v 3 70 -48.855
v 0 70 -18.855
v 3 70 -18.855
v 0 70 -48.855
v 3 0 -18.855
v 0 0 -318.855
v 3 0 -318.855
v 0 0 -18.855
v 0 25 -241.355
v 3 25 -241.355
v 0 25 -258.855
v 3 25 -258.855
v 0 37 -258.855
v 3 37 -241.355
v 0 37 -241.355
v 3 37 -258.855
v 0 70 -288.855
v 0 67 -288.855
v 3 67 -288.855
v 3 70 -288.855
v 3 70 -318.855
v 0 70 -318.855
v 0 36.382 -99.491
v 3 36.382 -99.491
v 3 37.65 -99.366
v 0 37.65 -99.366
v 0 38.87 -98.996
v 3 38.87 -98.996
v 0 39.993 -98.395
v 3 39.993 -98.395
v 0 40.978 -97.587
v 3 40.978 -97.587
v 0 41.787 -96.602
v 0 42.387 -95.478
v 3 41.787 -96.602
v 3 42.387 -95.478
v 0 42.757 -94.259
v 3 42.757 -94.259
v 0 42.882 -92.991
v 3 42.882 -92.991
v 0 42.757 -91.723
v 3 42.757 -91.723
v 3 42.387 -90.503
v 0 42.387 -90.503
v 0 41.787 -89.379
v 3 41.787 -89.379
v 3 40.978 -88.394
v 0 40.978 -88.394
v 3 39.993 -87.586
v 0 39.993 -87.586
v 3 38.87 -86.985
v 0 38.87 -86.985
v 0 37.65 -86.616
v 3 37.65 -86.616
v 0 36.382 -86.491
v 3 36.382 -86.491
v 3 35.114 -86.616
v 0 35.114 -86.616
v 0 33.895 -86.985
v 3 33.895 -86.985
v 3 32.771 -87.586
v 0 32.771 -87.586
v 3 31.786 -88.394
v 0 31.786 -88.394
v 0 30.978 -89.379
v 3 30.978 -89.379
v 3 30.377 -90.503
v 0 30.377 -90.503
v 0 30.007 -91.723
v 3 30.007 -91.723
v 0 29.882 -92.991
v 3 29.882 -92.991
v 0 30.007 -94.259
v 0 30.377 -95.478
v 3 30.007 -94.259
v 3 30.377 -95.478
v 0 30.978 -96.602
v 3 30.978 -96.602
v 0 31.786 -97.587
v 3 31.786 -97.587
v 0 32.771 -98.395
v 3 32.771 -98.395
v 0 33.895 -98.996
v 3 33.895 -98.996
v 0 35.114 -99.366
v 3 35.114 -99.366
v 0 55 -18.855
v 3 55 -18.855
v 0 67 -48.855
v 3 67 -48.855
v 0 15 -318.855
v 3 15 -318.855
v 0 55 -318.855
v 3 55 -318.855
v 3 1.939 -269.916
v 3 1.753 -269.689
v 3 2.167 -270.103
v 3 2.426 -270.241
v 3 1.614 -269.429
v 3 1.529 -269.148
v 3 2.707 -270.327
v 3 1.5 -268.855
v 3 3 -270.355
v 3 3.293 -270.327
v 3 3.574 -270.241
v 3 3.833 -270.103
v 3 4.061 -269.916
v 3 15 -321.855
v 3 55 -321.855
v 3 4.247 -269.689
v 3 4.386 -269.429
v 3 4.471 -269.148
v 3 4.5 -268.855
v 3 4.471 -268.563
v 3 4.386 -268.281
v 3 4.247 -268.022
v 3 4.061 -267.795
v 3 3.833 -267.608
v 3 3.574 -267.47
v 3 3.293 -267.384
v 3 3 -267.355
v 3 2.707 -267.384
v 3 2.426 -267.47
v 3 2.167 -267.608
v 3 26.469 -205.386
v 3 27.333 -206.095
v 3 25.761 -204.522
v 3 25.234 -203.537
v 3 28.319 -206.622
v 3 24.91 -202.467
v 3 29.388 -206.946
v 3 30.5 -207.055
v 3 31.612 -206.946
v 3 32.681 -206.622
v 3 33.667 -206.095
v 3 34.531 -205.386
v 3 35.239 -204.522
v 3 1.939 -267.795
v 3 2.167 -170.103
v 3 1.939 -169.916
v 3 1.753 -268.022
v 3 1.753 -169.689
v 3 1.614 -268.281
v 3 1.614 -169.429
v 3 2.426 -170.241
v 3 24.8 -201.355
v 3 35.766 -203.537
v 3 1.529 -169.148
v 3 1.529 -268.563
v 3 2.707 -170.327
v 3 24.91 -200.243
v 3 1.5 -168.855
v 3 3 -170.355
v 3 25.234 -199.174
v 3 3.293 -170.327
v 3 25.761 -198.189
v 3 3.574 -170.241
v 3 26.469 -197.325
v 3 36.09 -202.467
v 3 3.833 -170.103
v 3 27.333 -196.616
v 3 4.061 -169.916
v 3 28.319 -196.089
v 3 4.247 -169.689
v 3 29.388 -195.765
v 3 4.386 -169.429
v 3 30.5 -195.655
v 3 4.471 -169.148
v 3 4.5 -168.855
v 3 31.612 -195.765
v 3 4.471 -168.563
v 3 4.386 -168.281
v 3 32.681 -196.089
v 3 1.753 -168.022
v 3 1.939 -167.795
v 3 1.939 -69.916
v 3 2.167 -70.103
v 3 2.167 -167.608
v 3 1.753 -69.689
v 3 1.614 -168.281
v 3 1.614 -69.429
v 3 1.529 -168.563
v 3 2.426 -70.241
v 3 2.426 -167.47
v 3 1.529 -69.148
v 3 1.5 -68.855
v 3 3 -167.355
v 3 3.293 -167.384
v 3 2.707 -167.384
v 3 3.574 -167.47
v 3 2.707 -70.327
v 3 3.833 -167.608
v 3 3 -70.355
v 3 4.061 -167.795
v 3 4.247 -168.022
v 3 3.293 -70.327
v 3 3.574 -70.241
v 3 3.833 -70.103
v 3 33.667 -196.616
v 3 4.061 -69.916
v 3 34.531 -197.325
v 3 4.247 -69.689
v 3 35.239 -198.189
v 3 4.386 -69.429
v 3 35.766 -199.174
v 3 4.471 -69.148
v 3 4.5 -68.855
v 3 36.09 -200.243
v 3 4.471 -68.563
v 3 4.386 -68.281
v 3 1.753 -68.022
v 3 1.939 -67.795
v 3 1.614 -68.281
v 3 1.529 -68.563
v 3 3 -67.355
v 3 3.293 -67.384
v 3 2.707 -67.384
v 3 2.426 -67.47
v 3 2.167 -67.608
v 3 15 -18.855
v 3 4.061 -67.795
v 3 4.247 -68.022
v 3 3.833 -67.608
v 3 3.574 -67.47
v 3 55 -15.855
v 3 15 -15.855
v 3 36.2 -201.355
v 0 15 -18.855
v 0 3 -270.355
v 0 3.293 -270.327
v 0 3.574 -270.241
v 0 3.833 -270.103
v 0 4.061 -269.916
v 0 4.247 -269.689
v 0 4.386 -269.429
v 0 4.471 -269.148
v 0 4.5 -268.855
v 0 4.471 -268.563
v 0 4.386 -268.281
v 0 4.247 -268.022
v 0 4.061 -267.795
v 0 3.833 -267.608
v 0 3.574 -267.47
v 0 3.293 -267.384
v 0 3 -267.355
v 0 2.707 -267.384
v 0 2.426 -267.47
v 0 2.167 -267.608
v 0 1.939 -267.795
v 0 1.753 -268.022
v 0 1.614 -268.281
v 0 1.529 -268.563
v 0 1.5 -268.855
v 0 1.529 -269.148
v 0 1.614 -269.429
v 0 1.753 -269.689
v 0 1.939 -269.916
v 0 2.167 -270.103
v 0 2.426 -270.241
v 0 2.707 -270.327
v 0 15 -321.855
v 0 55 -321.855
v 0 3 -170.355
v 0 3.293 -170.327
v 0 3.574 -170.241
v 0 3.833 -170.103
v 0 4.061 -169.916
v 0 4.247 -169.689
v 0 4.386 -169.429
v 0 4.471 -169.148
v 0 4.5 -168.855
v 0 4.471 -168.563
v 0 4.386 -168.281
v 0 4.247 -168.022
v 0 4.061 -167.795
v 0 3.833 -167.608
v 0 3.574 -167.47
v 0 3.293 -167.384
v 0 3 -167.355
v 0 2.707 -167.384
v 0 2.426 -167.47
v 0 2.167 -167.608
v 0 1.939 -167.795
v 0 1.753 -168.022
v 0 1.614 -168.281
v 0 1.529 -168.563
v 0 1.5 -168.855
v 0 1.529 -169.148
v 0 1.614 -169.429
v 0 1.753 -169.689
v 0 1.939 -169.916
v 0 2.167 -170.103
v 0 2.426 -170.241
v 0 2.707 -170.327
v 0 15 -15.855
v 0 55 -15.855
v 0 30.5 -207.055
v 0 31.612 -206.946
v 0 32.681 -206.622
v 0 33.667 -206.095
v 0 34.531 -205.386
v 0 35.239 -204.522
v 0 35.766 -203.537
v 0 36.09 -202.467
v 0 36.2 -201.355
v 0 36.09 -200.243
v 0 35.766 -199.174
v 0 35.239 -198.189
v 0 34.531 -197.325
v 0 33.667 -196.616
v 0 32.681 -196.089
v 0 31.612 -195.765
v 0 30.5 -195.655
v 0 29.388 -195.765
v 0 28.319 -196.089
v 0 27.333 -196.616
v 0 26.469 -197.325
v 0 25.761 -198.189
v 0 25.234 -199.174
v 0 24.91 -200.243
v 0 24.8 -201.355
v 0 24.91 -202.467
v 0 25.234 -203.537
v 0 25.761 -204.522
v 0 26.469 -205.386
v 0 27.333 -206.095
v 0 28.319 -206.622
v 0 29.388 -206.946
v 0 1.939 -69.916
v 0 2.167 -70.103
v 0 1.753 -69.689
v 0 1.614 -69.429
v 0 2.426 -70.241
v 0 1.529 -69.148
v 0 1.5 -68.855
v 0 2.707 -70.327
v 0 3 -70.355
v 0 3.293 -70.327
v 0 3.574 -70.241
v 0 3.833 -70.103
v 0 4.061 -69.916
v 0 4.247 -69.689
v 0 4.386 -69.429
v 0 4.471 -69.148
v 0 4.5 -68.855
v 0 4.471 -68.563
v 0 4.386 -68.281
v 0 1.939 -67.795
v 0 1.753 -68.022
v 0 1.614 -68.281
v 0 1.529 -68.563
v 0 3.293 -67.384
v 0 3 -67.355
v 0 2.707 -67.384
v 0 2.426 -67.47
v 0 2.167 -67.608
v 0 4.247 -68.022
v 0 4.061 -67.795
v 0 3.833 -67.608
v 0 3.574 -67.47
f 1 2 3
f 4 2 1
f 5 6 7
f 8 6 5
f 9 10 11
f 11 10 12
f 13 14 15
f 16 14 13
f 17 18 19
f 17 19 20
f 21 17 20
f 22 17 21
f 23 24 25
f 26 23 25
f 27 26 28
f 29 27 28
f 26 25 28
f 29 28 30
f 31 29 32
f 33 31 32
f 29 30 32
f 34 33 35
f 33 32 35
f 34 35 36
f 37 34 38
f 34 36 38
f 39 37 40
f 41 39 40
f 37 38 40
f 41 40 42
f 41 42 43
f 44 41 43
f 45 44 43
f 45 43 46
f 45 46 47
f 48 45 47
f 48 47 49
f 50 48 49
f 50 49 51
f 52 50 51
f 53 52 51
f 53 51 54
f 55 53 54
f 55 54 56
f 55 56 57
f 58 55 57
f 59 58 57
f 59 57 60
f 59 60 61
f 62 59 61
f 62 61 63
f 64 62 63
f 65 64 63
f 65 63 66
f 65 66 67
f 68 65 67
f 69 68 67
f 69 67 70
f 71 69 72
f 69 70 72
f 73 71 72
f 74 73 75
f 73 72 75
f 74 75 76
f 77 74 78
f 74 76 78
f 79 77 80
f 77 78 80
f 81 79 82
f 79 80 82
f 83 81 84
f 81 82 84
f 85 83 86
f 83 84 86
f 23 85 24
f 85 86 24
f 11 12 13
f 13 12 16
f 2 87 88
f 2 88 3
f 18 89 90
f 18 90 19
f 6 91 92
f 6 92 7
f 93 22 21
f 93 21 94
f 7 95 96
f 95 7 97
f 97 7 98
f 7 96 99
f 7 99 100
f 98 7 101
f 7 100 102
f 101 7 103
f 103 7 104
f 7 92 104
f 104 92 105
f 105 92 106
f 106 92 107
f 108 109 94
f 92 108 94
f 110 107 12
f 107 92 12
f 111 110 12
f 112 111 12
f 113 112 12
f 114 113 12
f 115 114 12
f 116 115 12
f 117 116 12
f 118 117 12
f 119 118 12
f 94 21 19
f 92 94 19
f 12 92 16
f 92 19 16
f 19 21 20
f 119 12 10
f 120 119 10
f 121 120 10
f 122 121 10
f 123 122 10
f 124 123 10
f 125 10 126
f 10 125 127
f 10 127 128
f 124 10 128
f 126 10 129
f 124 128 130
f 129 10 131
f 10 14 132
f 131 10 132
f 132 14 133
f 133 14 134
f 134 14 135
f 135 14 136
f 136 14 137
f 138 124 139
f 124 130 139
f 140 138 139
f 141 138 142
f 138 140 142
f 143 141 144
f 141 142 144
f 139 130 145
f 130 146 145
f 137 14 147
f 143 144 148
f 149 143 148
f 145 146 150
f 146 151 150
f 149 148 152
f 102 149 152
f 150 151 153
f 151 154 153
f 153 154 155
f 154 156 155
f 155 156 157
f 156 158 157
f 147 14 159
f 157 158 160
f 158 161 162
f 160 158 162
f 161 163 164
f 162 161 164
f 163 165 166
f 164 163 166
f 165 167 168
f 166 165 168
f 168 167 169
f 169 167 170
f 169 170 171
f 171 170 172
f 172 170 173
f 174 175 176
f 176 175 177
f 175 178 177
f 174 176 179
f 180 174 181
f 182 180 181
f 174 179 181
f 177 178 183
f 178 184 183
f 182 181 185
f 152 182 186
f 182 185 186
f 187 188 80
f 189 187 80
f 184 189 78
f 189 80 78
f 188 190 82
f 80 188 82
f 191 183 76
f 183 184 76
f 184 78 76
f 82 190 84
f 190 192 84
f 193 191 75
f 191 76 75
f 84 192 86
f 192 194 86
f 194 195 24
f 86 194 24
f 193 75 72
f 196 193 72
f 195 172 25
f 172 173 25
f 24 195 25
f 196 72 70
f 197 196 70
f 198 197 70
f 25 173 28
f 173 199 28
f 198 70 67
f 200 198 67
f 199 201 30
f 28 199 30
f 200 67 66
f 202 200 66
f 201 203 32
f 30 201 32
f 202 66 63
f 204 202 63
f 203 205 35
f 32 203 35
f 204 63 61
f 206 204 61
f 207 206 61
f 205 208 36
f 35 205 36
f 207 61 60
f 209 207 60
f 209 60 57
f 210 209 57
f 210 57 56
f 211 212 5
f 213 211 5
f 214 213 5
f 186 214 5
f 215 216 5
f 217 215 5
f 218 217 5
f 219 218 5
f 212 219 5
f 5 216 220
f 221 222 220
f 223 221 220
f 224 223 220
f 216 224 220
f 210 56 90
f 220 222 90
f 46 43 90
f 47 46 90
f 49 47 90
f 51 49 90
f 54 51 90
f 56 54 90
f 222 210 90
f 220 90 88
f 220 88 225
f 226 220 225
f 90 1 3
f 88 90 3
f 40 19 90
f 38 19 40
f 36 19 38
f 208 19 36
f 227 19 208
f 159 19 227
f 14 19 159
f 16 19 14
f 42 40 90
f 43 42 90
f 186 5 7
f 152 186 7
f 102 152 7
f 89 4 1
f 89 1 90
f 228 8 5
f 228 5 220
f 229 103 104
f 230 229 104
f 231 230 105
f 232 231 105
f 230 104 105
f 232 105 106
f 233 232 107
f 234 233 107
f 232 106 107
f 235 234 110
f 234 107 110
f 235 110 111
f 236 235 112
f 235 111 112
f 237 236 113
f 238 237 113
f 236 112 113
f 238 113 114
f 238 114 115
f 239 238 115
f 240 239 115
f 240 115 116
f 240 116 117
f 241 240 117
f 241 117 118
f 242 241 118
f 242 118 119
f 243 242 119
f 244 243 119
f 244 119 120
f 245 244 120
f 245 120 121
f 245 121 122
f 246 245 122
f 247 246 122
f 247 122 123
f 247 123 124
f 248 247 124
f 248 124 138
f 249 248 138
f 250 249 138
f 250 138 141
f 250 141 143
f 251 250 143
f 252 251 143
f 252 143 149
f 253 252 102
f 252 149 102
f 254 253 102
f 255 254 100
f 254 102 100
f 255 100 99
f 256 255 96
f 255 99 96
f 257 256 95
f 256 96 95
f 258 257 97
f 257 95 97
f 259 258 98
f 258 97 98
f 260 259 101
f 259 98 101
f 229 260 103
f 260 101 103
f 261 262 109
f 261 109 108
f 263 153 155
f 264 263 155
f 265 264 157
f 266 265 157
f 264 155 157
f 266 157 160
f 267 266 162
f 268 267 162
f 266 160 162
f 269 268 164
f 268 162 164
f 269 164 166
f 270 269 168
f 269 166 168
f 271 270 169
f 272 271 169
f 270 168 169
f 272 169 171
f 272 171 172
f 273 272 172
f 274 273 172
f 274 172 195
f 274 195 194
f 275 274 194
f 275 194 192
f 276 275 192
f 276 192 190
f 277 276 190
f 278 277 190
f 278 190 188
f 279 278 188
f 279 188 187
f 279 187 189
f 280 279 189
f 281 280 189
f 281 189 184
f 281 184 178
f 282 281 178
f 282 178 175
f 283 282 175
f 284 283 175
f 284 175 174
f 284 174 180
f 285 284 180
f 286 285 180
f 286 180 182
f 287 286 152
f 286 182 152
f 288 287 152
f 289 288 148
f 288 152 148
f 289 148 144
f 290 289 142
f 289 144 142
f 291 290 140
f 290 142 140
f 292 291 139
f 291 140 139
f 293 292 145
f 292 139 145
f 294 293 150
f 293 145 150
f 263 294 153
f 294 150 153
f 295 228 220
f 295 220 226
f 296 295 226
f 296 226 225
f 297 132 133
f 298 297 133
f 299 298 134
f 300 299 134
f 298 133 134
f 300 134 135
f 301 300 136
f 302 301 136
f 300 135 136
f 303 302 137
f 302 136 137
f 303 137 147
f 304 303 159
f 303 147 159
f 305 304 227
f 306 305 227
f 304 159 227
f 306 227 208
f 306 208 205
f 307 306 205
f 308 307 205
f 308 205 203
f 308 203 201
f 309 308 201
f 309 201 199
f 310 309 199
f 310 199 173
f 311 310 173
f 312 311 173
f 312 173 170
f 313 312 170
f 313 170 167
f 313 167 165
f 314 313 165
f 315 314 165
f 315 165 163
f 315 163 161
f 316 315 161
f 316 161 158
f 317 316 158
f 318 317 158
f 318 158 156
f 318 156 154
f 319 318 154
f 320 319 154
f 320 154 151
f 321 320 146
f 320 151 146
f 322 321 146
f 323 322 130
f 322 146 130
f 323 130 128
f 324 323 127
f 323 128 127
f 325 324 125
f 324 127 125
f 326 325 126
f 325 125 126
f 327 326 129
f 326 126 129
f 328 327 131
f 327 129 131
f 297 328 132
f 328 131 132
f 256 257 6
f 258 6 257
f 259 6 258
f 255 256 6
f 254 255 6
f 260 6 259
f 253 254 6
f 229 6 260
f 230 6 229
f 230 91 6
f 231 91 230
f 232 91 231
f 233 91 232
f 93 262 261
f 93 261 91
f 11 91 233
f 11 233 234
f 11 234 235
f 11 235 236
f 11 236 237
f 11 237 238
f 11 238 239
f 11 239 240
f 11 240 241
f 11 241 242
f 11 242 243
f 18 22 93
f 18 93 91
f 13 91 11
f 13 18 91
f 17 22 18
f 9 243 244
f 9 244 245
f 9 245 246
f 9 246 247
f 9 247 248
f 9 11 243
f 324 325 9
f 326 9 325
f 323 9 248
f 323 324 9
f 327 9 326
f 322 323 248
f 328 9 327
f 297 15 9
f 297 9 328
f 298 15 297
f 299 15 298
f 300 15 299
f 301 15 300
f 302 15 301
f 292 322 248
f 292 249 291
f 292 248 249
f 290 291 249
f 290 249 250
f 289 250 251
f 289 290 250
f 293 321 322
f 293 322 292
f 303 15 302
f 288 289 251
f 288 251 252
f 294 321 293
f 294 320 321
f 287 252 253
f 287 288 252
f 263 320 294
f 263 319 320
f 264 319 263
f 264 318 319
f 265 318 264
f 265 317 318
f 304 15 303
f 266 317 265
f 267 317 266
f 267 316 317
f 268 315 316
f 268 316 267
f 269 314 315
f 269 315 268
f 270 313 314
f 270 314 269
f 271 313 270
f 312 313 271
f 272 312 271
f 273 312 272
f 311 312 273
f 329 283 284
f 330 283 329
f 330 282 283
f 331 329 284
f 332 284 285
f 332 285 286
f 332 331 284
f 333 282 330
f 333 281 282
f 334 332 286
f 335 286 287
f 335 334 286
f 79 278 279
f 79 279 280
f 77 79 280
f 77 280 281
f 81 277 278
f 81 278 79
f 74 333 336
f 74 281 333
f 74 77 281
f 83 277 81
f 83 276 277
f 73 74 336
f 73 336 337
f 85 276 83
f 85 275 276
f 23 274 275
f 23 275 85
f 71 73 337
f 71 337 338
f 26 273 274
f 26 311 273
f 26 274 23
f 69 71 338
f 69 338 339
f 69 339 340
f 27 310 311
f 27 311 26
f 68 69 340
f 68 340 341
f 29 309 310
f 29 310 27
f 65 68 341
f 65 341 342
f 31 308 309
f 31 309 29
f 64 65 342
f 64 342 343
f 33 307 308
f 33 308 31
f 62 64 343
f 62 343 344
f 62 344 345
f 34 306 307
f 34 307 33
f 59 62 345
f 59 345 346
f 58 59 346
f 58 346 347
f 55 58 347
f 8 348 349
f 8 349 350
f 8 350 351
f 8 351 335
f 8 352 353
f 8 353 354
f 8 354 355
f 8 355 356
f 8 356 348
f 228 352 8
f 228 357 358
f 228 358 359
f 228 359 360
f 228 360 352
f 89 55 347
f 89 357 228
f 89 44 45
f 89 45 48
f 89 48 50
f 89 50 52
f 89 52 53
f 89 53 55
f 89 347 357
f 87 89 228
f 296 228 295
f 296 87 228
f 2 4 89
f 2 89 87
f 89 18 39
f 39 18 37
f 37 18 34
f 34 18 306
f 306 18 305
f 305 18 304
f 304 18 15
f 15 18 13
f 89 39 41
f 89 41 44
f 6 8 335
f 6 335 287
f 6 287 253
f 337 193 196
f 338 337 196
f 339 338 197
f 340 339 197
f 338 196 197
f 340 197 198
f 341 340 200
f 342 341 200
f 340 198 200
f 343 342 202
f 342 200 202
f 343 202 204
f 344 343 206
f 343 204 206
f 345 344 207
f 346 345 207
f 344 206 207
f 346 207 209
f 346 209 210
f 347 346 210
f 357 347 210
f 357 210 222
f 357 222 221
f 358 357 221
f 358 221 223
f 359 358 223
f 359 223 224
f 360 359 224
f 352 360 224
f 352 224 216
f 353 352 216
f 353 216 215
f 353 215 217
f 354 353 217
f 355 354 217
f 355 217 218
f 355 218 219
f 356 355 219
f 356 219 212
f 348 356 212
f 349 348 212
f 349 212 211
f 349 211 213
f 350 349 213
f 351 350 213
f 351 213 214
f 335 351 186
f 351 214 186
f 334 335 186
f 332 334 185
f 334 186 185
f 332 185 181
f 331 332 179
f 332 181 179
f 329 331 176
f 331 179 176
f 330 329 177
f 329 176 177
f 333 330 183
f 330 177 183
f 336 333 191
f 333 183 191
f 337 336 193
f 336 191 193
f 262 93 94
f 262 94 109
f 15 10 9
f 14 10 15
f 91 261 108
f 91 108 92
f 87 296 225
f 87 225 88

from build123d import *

# Parameters (mm, degrees)
BOSS_EXTRUDE2_DEPTH     = 3
CUT_EXTRUDE1_DEPTH      = 330.393231219
CUT_EXTRUDE1_DEPTH_BACK = 3
SKETCH4_W               = 17.5
SKETCH4_H               = 12
CUT_EXTRUDE2_DEPTH      = 10
SKETCH5_R               = 5.7
CUT_EXTRUDE3_DEPTH      = 10
SKETCH6_R               = 6.5
CUT_EXTRUDE4_DEPTH      = 10
SKETCH7_R               = 1.5
CUT_EXTRUDE5_DEPTH      = 10


with BuildPart() as part:
    # Sketch1 → Boss-Extrude2 (new body)
    with BuildSketch(Plane(origin=(0, 0, 0), x_dir=(0, 0, -1), z_dir=(1, 0, 0))):
        Polygon((18.855403516, 70), (318.855403516, 70), (318.855403516, 55), (321.855403516, 55), (321.855403516, 15), (318.855403516, 15), (318.855403516, 0), (18.855403516, 0), (18.855403516, 15), (15.855403516, 15), (15.855403516, 55), (18.855403516, 55), align=None)
    extrude(amount=BOSS_EXTRUDE2_DEPTH)

    # Sketch3 → Cut-Extrude1 (cut, two sides: drawn at the far end of the back side and taken through both)
    with BuildSketch(Plane(origin=(3, 0, 0), x_dir=(0, 0, -1), z_dir=(1, 0, 0)).offset(-CUT_EXTRUDE1_DEPTH_BACK)):
        Polygon((48.855403516, 643.663019898), (48.855403516, 70), (48.855403516, 67), (288.855403516, 67), (288.855403516, 70), (288.855403516, 643.663019898), (288.855403516, 1790.989059693), (48.855403516, 1790.989059693), align=None)
    extrude(amount=CUT_EXTRUDE1_DEPTH + CUT_EXTRUDE1_DEPTH_BACK, mode=Mode.SUBTRACT)

    # Sketch4 → Cut-Extrude2 (cut)
    with BuildSketch(Plane(origin=(3, 0, 0), x_dir=(0, 0, -1), z_dir=(1, 0, 0))):
        with Locations((250.105403516, 31)):
            Rectangle(SKETCH4_W, SKETCH4_H)
    extrude(amount=-CUT_EXTRUDE2_DEPTH, mode=Mode.SUBTRACT)

    # Sketch5 → Cut-Extrude3 (cut)
    with BuildSketch(Plane(origin=(3, 0, 0), x_dir=(0, 0, -1), z_dir=(1, 0, 0))):
        with Locations((201.355403516, 30.5)):
            Circle(SKETCH5_R)
    extrude(amount=-CUT_EXTRUDE3_DEPTH, mode=Mode.SUBTRACT)

    # Sketch6 → Cut-Extrude4 (cut)
    with BuildSketch(Plane(origin=(3, 0, 0), x_dir=(0, 0, -1), z_dir=(1, 0, 0))):
        with Locations((92.990637001, 36.382151617)):
            Circle(SKETCH6_R)
    extrude(amount=-CUT_EXTRUDE4_DEPTH, mode=Mode.SUBTRACT)

    # Sketch7 → Cut-Extrude5 (cut)
    with BuildSketch(Plane(origin=(3, 0, 0), x_dir=(0, 0, -1), z_dir=(1, 0, 0))):
        with Locations((268.855403516, 3)):
            Circle(SKETCH7_R)
        with Locations((168.855403516, 3)):
            Circle(SKETCH7_R)
        with Locations((68.855403516, 3)):
            Circle(SKETCH7_R)
    extrude(amount=-CUT_EXTRUDE5_DEPTH, mode=Mode.SUBTRACT)


solid = part.part
